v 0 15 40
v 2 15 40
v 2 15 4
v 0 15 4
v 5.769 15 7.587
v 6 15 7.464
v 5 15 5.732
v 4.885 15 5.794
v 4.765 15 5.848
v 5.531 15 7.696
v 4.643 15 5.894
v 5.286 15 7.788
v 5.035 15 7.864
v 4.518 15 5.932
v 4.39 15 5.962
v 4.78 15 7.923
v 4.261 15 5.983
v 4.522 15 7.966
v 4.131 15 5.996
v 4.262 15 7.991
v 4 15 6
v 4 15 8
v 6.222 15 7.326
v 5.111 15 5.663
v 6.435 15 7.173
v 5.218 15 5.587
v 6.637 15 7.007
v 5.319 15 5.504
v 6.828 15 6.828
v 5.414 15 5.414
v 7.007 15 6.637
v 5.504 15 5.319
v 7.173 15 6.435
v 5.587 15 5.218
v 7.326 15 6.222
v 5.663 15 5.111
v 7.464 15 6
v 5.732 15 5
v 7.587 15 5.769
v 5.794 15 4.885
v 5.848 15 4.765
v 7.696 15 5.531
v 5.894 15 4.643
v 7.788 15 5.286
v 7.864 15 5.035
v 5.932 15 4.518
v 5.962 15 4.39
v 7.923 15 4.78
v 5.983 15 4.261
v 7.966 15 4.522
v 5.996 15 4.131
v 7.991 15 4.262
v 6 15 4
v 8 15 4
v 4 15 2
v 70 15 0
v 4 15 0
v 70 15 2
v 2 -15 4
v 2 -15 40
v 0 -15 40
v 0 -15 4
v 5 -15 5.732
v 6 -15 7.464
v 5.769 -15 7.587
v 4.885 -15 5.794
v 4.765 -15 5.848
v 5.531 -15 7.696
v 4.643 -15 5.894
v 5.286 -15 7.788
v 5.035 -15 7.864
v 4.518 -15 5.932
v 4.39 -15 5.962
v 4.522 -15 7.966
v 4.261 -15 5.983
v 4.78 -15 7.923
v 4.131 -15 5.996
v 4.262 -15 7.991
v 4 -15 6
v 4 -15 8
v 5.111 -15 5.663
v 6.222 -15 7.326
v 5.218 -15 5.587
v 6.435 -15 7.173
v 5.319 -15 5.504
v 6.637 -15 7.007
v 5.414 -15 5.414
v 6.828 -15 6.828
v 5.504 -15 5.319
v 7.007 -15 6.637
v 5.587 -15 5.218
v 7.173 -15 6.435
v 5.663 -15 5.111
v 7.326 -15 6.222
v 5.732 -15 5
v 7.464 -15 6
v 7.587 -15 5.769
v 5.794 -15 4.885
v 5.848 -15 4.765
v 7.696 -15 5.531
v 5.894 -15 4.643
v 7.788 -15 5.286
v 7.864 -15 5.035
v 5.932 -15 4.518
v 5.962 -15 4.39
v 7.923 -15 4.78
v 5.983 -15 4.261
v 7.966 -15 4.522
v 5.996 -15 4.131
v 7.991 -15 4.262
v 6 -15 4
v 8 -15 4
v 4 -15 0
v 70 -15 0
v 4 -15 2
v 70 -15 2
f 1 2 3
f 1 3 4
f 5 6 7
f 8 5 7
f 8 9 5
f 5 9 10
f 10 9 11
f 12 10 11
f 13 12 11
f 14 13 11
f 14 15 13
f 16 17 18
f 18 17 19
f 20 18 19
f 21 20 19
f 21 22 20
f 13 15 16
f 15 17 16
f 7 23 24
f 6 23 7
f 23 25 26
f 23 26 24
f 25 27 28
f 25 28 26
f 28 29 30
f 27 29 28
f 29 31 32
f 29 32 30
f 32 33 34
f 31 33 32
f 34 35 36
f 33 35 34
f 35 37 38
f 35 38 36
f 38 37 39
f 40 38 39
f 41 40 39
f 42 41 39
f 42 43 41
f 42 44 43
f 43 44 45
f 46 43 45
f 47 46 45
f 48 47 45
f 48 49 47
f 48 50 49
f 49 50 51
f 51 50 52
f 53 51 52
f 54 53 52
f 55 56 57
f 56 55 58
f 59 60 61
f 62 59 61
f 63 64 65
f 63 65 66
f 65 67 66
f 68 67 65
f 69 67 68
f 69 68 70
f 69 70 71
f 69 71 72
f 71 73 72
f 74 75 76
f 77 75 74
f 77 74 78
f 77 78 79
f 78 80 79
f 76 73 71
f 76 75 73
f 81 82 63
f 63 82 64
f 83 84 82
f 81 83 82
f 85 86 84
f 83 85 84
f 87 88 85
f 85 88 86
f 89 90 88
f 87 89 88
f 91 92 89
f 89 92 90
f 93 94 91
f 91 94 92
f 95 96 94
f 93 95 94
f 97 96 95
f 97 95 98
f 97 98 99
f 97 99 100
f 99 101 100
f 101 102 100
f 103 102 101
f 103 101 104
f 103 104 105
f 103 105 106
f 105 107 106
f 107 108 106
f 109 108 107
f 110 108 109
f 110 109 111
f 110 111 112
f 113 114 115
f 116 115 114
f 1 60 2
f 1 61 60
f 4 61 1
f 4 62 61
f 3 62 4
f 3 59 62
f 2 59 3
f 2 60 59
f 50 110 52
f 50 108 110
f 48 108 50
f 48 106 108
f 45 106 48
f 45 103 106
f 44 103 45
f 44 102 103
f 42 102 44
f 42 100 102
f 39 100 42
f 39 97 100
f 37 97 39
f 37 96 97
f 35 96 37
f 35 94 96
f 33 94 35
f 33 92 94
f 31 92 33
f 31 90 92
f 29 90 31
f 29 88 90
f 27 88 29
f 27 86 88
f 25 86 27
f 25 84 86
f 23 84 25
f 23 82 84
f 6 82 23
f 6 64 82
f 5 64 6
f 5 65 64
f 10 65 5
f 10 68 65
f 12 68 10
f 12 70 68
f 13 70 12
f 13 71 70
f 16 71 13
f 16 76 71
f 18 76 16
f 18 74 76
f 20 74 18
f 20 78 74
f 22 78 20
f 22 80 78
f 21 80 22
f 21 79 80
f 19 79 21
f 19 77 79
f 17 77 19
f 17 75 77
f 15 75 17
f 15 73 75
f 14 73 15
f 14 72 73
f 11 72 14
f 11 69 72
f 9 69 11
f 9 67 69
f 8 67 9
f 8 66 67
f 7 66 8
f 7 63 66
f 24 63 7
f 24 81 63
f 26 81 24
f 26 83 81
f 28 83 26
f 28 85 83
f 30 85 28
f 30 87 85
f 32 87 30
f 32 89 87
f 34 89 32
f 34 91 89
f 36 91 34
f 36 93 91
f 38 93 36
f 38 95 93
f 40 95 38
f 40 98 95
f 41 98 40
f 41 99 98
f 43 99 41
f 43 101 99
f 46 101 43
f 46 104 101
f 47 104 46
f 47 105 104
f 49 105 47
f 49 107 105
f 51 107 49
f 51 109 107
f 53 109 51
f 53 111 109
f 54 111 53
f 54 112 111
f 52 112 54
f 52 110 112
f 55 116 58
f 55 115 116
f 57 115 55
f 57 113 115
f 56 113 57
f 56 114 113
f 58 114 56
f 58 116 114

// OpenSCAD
// Units: mm
thickness_mm = 2.0;
bend_radius_mm = 2.0;
k_factor = 0.45;
bend_angle_deg = 90;
bend_angle_rad = PI / 2;

flange_a_outside_mm = 70.0;
flange_b_outside_mm = 40.0;
bracket_width_mm = 30.0;

outside_radius_mm = bend_radius_mm + thickness_mm;
outside_setback_mm = outside_radius_mm * tan(bend_angle_deg / 2);
bend_allowance_mm = bend_angle_rad * (bend_radius_mm + k_factor * thickness_mm);
bend_deduction_mm = 2 * outside_setback_mm - bend_allowance_mm;
flat_length_mm = flange_a_outside_mm + flange_b_outside_mm - bend_deduction_mm;

echo(str(
    "MAKERBENCH-SHEETMETAL: {\"thickness_mm\": ",
    thickness_mm,
    ", \"bend_radius_mm\": ",
    bend_radius_mm,
    ", \"flat_length_mm\": ",
    flat_length_mm,
    "}"
));

$fn = 96;

module l_bracket_sheet() {
    rotate([90, 0, 0])
        linear_extrude(height = bracket_width_mm, center = true, convexity = 10)
            union() {
                // Straight flange outside lengths are measured to the virtual sharp outside corner.
                translate([outside_radius_mm, 0])
                    square([
                        flange_a_outside_mm - outside_radius_mm,
                        thickness_mm
                    ]);

                translate([0, outside_radius_mm])
                    square([
                        thickness_mm,
                        flange_b_outside_mm - outside_radius_mm
                    ]);

                // Single 90-degree bend: quarter annulus, inside radius 2 mm, outside radius 4 mm.
                difference() {
                    translate([outside_radius_mm, outside_radius_mm])
                        circle(r = outside_radius_mm);
                    translate([outside_radius_mm, outside_radius_mm])
                        circle(r = bend_radius_mm);
                    translate([-outside_radius_mm, -outside_radius_mm])
                        square([outside_radius_mm * 2, outside_radius_mm * 4]);
                    translate([-outside_radius_mm, -outside_radius_mm])
                        square([outside_radius_mm * 4, outside_radius_mm * 2]);
                }
            }
}

l_bracket_sheet();
